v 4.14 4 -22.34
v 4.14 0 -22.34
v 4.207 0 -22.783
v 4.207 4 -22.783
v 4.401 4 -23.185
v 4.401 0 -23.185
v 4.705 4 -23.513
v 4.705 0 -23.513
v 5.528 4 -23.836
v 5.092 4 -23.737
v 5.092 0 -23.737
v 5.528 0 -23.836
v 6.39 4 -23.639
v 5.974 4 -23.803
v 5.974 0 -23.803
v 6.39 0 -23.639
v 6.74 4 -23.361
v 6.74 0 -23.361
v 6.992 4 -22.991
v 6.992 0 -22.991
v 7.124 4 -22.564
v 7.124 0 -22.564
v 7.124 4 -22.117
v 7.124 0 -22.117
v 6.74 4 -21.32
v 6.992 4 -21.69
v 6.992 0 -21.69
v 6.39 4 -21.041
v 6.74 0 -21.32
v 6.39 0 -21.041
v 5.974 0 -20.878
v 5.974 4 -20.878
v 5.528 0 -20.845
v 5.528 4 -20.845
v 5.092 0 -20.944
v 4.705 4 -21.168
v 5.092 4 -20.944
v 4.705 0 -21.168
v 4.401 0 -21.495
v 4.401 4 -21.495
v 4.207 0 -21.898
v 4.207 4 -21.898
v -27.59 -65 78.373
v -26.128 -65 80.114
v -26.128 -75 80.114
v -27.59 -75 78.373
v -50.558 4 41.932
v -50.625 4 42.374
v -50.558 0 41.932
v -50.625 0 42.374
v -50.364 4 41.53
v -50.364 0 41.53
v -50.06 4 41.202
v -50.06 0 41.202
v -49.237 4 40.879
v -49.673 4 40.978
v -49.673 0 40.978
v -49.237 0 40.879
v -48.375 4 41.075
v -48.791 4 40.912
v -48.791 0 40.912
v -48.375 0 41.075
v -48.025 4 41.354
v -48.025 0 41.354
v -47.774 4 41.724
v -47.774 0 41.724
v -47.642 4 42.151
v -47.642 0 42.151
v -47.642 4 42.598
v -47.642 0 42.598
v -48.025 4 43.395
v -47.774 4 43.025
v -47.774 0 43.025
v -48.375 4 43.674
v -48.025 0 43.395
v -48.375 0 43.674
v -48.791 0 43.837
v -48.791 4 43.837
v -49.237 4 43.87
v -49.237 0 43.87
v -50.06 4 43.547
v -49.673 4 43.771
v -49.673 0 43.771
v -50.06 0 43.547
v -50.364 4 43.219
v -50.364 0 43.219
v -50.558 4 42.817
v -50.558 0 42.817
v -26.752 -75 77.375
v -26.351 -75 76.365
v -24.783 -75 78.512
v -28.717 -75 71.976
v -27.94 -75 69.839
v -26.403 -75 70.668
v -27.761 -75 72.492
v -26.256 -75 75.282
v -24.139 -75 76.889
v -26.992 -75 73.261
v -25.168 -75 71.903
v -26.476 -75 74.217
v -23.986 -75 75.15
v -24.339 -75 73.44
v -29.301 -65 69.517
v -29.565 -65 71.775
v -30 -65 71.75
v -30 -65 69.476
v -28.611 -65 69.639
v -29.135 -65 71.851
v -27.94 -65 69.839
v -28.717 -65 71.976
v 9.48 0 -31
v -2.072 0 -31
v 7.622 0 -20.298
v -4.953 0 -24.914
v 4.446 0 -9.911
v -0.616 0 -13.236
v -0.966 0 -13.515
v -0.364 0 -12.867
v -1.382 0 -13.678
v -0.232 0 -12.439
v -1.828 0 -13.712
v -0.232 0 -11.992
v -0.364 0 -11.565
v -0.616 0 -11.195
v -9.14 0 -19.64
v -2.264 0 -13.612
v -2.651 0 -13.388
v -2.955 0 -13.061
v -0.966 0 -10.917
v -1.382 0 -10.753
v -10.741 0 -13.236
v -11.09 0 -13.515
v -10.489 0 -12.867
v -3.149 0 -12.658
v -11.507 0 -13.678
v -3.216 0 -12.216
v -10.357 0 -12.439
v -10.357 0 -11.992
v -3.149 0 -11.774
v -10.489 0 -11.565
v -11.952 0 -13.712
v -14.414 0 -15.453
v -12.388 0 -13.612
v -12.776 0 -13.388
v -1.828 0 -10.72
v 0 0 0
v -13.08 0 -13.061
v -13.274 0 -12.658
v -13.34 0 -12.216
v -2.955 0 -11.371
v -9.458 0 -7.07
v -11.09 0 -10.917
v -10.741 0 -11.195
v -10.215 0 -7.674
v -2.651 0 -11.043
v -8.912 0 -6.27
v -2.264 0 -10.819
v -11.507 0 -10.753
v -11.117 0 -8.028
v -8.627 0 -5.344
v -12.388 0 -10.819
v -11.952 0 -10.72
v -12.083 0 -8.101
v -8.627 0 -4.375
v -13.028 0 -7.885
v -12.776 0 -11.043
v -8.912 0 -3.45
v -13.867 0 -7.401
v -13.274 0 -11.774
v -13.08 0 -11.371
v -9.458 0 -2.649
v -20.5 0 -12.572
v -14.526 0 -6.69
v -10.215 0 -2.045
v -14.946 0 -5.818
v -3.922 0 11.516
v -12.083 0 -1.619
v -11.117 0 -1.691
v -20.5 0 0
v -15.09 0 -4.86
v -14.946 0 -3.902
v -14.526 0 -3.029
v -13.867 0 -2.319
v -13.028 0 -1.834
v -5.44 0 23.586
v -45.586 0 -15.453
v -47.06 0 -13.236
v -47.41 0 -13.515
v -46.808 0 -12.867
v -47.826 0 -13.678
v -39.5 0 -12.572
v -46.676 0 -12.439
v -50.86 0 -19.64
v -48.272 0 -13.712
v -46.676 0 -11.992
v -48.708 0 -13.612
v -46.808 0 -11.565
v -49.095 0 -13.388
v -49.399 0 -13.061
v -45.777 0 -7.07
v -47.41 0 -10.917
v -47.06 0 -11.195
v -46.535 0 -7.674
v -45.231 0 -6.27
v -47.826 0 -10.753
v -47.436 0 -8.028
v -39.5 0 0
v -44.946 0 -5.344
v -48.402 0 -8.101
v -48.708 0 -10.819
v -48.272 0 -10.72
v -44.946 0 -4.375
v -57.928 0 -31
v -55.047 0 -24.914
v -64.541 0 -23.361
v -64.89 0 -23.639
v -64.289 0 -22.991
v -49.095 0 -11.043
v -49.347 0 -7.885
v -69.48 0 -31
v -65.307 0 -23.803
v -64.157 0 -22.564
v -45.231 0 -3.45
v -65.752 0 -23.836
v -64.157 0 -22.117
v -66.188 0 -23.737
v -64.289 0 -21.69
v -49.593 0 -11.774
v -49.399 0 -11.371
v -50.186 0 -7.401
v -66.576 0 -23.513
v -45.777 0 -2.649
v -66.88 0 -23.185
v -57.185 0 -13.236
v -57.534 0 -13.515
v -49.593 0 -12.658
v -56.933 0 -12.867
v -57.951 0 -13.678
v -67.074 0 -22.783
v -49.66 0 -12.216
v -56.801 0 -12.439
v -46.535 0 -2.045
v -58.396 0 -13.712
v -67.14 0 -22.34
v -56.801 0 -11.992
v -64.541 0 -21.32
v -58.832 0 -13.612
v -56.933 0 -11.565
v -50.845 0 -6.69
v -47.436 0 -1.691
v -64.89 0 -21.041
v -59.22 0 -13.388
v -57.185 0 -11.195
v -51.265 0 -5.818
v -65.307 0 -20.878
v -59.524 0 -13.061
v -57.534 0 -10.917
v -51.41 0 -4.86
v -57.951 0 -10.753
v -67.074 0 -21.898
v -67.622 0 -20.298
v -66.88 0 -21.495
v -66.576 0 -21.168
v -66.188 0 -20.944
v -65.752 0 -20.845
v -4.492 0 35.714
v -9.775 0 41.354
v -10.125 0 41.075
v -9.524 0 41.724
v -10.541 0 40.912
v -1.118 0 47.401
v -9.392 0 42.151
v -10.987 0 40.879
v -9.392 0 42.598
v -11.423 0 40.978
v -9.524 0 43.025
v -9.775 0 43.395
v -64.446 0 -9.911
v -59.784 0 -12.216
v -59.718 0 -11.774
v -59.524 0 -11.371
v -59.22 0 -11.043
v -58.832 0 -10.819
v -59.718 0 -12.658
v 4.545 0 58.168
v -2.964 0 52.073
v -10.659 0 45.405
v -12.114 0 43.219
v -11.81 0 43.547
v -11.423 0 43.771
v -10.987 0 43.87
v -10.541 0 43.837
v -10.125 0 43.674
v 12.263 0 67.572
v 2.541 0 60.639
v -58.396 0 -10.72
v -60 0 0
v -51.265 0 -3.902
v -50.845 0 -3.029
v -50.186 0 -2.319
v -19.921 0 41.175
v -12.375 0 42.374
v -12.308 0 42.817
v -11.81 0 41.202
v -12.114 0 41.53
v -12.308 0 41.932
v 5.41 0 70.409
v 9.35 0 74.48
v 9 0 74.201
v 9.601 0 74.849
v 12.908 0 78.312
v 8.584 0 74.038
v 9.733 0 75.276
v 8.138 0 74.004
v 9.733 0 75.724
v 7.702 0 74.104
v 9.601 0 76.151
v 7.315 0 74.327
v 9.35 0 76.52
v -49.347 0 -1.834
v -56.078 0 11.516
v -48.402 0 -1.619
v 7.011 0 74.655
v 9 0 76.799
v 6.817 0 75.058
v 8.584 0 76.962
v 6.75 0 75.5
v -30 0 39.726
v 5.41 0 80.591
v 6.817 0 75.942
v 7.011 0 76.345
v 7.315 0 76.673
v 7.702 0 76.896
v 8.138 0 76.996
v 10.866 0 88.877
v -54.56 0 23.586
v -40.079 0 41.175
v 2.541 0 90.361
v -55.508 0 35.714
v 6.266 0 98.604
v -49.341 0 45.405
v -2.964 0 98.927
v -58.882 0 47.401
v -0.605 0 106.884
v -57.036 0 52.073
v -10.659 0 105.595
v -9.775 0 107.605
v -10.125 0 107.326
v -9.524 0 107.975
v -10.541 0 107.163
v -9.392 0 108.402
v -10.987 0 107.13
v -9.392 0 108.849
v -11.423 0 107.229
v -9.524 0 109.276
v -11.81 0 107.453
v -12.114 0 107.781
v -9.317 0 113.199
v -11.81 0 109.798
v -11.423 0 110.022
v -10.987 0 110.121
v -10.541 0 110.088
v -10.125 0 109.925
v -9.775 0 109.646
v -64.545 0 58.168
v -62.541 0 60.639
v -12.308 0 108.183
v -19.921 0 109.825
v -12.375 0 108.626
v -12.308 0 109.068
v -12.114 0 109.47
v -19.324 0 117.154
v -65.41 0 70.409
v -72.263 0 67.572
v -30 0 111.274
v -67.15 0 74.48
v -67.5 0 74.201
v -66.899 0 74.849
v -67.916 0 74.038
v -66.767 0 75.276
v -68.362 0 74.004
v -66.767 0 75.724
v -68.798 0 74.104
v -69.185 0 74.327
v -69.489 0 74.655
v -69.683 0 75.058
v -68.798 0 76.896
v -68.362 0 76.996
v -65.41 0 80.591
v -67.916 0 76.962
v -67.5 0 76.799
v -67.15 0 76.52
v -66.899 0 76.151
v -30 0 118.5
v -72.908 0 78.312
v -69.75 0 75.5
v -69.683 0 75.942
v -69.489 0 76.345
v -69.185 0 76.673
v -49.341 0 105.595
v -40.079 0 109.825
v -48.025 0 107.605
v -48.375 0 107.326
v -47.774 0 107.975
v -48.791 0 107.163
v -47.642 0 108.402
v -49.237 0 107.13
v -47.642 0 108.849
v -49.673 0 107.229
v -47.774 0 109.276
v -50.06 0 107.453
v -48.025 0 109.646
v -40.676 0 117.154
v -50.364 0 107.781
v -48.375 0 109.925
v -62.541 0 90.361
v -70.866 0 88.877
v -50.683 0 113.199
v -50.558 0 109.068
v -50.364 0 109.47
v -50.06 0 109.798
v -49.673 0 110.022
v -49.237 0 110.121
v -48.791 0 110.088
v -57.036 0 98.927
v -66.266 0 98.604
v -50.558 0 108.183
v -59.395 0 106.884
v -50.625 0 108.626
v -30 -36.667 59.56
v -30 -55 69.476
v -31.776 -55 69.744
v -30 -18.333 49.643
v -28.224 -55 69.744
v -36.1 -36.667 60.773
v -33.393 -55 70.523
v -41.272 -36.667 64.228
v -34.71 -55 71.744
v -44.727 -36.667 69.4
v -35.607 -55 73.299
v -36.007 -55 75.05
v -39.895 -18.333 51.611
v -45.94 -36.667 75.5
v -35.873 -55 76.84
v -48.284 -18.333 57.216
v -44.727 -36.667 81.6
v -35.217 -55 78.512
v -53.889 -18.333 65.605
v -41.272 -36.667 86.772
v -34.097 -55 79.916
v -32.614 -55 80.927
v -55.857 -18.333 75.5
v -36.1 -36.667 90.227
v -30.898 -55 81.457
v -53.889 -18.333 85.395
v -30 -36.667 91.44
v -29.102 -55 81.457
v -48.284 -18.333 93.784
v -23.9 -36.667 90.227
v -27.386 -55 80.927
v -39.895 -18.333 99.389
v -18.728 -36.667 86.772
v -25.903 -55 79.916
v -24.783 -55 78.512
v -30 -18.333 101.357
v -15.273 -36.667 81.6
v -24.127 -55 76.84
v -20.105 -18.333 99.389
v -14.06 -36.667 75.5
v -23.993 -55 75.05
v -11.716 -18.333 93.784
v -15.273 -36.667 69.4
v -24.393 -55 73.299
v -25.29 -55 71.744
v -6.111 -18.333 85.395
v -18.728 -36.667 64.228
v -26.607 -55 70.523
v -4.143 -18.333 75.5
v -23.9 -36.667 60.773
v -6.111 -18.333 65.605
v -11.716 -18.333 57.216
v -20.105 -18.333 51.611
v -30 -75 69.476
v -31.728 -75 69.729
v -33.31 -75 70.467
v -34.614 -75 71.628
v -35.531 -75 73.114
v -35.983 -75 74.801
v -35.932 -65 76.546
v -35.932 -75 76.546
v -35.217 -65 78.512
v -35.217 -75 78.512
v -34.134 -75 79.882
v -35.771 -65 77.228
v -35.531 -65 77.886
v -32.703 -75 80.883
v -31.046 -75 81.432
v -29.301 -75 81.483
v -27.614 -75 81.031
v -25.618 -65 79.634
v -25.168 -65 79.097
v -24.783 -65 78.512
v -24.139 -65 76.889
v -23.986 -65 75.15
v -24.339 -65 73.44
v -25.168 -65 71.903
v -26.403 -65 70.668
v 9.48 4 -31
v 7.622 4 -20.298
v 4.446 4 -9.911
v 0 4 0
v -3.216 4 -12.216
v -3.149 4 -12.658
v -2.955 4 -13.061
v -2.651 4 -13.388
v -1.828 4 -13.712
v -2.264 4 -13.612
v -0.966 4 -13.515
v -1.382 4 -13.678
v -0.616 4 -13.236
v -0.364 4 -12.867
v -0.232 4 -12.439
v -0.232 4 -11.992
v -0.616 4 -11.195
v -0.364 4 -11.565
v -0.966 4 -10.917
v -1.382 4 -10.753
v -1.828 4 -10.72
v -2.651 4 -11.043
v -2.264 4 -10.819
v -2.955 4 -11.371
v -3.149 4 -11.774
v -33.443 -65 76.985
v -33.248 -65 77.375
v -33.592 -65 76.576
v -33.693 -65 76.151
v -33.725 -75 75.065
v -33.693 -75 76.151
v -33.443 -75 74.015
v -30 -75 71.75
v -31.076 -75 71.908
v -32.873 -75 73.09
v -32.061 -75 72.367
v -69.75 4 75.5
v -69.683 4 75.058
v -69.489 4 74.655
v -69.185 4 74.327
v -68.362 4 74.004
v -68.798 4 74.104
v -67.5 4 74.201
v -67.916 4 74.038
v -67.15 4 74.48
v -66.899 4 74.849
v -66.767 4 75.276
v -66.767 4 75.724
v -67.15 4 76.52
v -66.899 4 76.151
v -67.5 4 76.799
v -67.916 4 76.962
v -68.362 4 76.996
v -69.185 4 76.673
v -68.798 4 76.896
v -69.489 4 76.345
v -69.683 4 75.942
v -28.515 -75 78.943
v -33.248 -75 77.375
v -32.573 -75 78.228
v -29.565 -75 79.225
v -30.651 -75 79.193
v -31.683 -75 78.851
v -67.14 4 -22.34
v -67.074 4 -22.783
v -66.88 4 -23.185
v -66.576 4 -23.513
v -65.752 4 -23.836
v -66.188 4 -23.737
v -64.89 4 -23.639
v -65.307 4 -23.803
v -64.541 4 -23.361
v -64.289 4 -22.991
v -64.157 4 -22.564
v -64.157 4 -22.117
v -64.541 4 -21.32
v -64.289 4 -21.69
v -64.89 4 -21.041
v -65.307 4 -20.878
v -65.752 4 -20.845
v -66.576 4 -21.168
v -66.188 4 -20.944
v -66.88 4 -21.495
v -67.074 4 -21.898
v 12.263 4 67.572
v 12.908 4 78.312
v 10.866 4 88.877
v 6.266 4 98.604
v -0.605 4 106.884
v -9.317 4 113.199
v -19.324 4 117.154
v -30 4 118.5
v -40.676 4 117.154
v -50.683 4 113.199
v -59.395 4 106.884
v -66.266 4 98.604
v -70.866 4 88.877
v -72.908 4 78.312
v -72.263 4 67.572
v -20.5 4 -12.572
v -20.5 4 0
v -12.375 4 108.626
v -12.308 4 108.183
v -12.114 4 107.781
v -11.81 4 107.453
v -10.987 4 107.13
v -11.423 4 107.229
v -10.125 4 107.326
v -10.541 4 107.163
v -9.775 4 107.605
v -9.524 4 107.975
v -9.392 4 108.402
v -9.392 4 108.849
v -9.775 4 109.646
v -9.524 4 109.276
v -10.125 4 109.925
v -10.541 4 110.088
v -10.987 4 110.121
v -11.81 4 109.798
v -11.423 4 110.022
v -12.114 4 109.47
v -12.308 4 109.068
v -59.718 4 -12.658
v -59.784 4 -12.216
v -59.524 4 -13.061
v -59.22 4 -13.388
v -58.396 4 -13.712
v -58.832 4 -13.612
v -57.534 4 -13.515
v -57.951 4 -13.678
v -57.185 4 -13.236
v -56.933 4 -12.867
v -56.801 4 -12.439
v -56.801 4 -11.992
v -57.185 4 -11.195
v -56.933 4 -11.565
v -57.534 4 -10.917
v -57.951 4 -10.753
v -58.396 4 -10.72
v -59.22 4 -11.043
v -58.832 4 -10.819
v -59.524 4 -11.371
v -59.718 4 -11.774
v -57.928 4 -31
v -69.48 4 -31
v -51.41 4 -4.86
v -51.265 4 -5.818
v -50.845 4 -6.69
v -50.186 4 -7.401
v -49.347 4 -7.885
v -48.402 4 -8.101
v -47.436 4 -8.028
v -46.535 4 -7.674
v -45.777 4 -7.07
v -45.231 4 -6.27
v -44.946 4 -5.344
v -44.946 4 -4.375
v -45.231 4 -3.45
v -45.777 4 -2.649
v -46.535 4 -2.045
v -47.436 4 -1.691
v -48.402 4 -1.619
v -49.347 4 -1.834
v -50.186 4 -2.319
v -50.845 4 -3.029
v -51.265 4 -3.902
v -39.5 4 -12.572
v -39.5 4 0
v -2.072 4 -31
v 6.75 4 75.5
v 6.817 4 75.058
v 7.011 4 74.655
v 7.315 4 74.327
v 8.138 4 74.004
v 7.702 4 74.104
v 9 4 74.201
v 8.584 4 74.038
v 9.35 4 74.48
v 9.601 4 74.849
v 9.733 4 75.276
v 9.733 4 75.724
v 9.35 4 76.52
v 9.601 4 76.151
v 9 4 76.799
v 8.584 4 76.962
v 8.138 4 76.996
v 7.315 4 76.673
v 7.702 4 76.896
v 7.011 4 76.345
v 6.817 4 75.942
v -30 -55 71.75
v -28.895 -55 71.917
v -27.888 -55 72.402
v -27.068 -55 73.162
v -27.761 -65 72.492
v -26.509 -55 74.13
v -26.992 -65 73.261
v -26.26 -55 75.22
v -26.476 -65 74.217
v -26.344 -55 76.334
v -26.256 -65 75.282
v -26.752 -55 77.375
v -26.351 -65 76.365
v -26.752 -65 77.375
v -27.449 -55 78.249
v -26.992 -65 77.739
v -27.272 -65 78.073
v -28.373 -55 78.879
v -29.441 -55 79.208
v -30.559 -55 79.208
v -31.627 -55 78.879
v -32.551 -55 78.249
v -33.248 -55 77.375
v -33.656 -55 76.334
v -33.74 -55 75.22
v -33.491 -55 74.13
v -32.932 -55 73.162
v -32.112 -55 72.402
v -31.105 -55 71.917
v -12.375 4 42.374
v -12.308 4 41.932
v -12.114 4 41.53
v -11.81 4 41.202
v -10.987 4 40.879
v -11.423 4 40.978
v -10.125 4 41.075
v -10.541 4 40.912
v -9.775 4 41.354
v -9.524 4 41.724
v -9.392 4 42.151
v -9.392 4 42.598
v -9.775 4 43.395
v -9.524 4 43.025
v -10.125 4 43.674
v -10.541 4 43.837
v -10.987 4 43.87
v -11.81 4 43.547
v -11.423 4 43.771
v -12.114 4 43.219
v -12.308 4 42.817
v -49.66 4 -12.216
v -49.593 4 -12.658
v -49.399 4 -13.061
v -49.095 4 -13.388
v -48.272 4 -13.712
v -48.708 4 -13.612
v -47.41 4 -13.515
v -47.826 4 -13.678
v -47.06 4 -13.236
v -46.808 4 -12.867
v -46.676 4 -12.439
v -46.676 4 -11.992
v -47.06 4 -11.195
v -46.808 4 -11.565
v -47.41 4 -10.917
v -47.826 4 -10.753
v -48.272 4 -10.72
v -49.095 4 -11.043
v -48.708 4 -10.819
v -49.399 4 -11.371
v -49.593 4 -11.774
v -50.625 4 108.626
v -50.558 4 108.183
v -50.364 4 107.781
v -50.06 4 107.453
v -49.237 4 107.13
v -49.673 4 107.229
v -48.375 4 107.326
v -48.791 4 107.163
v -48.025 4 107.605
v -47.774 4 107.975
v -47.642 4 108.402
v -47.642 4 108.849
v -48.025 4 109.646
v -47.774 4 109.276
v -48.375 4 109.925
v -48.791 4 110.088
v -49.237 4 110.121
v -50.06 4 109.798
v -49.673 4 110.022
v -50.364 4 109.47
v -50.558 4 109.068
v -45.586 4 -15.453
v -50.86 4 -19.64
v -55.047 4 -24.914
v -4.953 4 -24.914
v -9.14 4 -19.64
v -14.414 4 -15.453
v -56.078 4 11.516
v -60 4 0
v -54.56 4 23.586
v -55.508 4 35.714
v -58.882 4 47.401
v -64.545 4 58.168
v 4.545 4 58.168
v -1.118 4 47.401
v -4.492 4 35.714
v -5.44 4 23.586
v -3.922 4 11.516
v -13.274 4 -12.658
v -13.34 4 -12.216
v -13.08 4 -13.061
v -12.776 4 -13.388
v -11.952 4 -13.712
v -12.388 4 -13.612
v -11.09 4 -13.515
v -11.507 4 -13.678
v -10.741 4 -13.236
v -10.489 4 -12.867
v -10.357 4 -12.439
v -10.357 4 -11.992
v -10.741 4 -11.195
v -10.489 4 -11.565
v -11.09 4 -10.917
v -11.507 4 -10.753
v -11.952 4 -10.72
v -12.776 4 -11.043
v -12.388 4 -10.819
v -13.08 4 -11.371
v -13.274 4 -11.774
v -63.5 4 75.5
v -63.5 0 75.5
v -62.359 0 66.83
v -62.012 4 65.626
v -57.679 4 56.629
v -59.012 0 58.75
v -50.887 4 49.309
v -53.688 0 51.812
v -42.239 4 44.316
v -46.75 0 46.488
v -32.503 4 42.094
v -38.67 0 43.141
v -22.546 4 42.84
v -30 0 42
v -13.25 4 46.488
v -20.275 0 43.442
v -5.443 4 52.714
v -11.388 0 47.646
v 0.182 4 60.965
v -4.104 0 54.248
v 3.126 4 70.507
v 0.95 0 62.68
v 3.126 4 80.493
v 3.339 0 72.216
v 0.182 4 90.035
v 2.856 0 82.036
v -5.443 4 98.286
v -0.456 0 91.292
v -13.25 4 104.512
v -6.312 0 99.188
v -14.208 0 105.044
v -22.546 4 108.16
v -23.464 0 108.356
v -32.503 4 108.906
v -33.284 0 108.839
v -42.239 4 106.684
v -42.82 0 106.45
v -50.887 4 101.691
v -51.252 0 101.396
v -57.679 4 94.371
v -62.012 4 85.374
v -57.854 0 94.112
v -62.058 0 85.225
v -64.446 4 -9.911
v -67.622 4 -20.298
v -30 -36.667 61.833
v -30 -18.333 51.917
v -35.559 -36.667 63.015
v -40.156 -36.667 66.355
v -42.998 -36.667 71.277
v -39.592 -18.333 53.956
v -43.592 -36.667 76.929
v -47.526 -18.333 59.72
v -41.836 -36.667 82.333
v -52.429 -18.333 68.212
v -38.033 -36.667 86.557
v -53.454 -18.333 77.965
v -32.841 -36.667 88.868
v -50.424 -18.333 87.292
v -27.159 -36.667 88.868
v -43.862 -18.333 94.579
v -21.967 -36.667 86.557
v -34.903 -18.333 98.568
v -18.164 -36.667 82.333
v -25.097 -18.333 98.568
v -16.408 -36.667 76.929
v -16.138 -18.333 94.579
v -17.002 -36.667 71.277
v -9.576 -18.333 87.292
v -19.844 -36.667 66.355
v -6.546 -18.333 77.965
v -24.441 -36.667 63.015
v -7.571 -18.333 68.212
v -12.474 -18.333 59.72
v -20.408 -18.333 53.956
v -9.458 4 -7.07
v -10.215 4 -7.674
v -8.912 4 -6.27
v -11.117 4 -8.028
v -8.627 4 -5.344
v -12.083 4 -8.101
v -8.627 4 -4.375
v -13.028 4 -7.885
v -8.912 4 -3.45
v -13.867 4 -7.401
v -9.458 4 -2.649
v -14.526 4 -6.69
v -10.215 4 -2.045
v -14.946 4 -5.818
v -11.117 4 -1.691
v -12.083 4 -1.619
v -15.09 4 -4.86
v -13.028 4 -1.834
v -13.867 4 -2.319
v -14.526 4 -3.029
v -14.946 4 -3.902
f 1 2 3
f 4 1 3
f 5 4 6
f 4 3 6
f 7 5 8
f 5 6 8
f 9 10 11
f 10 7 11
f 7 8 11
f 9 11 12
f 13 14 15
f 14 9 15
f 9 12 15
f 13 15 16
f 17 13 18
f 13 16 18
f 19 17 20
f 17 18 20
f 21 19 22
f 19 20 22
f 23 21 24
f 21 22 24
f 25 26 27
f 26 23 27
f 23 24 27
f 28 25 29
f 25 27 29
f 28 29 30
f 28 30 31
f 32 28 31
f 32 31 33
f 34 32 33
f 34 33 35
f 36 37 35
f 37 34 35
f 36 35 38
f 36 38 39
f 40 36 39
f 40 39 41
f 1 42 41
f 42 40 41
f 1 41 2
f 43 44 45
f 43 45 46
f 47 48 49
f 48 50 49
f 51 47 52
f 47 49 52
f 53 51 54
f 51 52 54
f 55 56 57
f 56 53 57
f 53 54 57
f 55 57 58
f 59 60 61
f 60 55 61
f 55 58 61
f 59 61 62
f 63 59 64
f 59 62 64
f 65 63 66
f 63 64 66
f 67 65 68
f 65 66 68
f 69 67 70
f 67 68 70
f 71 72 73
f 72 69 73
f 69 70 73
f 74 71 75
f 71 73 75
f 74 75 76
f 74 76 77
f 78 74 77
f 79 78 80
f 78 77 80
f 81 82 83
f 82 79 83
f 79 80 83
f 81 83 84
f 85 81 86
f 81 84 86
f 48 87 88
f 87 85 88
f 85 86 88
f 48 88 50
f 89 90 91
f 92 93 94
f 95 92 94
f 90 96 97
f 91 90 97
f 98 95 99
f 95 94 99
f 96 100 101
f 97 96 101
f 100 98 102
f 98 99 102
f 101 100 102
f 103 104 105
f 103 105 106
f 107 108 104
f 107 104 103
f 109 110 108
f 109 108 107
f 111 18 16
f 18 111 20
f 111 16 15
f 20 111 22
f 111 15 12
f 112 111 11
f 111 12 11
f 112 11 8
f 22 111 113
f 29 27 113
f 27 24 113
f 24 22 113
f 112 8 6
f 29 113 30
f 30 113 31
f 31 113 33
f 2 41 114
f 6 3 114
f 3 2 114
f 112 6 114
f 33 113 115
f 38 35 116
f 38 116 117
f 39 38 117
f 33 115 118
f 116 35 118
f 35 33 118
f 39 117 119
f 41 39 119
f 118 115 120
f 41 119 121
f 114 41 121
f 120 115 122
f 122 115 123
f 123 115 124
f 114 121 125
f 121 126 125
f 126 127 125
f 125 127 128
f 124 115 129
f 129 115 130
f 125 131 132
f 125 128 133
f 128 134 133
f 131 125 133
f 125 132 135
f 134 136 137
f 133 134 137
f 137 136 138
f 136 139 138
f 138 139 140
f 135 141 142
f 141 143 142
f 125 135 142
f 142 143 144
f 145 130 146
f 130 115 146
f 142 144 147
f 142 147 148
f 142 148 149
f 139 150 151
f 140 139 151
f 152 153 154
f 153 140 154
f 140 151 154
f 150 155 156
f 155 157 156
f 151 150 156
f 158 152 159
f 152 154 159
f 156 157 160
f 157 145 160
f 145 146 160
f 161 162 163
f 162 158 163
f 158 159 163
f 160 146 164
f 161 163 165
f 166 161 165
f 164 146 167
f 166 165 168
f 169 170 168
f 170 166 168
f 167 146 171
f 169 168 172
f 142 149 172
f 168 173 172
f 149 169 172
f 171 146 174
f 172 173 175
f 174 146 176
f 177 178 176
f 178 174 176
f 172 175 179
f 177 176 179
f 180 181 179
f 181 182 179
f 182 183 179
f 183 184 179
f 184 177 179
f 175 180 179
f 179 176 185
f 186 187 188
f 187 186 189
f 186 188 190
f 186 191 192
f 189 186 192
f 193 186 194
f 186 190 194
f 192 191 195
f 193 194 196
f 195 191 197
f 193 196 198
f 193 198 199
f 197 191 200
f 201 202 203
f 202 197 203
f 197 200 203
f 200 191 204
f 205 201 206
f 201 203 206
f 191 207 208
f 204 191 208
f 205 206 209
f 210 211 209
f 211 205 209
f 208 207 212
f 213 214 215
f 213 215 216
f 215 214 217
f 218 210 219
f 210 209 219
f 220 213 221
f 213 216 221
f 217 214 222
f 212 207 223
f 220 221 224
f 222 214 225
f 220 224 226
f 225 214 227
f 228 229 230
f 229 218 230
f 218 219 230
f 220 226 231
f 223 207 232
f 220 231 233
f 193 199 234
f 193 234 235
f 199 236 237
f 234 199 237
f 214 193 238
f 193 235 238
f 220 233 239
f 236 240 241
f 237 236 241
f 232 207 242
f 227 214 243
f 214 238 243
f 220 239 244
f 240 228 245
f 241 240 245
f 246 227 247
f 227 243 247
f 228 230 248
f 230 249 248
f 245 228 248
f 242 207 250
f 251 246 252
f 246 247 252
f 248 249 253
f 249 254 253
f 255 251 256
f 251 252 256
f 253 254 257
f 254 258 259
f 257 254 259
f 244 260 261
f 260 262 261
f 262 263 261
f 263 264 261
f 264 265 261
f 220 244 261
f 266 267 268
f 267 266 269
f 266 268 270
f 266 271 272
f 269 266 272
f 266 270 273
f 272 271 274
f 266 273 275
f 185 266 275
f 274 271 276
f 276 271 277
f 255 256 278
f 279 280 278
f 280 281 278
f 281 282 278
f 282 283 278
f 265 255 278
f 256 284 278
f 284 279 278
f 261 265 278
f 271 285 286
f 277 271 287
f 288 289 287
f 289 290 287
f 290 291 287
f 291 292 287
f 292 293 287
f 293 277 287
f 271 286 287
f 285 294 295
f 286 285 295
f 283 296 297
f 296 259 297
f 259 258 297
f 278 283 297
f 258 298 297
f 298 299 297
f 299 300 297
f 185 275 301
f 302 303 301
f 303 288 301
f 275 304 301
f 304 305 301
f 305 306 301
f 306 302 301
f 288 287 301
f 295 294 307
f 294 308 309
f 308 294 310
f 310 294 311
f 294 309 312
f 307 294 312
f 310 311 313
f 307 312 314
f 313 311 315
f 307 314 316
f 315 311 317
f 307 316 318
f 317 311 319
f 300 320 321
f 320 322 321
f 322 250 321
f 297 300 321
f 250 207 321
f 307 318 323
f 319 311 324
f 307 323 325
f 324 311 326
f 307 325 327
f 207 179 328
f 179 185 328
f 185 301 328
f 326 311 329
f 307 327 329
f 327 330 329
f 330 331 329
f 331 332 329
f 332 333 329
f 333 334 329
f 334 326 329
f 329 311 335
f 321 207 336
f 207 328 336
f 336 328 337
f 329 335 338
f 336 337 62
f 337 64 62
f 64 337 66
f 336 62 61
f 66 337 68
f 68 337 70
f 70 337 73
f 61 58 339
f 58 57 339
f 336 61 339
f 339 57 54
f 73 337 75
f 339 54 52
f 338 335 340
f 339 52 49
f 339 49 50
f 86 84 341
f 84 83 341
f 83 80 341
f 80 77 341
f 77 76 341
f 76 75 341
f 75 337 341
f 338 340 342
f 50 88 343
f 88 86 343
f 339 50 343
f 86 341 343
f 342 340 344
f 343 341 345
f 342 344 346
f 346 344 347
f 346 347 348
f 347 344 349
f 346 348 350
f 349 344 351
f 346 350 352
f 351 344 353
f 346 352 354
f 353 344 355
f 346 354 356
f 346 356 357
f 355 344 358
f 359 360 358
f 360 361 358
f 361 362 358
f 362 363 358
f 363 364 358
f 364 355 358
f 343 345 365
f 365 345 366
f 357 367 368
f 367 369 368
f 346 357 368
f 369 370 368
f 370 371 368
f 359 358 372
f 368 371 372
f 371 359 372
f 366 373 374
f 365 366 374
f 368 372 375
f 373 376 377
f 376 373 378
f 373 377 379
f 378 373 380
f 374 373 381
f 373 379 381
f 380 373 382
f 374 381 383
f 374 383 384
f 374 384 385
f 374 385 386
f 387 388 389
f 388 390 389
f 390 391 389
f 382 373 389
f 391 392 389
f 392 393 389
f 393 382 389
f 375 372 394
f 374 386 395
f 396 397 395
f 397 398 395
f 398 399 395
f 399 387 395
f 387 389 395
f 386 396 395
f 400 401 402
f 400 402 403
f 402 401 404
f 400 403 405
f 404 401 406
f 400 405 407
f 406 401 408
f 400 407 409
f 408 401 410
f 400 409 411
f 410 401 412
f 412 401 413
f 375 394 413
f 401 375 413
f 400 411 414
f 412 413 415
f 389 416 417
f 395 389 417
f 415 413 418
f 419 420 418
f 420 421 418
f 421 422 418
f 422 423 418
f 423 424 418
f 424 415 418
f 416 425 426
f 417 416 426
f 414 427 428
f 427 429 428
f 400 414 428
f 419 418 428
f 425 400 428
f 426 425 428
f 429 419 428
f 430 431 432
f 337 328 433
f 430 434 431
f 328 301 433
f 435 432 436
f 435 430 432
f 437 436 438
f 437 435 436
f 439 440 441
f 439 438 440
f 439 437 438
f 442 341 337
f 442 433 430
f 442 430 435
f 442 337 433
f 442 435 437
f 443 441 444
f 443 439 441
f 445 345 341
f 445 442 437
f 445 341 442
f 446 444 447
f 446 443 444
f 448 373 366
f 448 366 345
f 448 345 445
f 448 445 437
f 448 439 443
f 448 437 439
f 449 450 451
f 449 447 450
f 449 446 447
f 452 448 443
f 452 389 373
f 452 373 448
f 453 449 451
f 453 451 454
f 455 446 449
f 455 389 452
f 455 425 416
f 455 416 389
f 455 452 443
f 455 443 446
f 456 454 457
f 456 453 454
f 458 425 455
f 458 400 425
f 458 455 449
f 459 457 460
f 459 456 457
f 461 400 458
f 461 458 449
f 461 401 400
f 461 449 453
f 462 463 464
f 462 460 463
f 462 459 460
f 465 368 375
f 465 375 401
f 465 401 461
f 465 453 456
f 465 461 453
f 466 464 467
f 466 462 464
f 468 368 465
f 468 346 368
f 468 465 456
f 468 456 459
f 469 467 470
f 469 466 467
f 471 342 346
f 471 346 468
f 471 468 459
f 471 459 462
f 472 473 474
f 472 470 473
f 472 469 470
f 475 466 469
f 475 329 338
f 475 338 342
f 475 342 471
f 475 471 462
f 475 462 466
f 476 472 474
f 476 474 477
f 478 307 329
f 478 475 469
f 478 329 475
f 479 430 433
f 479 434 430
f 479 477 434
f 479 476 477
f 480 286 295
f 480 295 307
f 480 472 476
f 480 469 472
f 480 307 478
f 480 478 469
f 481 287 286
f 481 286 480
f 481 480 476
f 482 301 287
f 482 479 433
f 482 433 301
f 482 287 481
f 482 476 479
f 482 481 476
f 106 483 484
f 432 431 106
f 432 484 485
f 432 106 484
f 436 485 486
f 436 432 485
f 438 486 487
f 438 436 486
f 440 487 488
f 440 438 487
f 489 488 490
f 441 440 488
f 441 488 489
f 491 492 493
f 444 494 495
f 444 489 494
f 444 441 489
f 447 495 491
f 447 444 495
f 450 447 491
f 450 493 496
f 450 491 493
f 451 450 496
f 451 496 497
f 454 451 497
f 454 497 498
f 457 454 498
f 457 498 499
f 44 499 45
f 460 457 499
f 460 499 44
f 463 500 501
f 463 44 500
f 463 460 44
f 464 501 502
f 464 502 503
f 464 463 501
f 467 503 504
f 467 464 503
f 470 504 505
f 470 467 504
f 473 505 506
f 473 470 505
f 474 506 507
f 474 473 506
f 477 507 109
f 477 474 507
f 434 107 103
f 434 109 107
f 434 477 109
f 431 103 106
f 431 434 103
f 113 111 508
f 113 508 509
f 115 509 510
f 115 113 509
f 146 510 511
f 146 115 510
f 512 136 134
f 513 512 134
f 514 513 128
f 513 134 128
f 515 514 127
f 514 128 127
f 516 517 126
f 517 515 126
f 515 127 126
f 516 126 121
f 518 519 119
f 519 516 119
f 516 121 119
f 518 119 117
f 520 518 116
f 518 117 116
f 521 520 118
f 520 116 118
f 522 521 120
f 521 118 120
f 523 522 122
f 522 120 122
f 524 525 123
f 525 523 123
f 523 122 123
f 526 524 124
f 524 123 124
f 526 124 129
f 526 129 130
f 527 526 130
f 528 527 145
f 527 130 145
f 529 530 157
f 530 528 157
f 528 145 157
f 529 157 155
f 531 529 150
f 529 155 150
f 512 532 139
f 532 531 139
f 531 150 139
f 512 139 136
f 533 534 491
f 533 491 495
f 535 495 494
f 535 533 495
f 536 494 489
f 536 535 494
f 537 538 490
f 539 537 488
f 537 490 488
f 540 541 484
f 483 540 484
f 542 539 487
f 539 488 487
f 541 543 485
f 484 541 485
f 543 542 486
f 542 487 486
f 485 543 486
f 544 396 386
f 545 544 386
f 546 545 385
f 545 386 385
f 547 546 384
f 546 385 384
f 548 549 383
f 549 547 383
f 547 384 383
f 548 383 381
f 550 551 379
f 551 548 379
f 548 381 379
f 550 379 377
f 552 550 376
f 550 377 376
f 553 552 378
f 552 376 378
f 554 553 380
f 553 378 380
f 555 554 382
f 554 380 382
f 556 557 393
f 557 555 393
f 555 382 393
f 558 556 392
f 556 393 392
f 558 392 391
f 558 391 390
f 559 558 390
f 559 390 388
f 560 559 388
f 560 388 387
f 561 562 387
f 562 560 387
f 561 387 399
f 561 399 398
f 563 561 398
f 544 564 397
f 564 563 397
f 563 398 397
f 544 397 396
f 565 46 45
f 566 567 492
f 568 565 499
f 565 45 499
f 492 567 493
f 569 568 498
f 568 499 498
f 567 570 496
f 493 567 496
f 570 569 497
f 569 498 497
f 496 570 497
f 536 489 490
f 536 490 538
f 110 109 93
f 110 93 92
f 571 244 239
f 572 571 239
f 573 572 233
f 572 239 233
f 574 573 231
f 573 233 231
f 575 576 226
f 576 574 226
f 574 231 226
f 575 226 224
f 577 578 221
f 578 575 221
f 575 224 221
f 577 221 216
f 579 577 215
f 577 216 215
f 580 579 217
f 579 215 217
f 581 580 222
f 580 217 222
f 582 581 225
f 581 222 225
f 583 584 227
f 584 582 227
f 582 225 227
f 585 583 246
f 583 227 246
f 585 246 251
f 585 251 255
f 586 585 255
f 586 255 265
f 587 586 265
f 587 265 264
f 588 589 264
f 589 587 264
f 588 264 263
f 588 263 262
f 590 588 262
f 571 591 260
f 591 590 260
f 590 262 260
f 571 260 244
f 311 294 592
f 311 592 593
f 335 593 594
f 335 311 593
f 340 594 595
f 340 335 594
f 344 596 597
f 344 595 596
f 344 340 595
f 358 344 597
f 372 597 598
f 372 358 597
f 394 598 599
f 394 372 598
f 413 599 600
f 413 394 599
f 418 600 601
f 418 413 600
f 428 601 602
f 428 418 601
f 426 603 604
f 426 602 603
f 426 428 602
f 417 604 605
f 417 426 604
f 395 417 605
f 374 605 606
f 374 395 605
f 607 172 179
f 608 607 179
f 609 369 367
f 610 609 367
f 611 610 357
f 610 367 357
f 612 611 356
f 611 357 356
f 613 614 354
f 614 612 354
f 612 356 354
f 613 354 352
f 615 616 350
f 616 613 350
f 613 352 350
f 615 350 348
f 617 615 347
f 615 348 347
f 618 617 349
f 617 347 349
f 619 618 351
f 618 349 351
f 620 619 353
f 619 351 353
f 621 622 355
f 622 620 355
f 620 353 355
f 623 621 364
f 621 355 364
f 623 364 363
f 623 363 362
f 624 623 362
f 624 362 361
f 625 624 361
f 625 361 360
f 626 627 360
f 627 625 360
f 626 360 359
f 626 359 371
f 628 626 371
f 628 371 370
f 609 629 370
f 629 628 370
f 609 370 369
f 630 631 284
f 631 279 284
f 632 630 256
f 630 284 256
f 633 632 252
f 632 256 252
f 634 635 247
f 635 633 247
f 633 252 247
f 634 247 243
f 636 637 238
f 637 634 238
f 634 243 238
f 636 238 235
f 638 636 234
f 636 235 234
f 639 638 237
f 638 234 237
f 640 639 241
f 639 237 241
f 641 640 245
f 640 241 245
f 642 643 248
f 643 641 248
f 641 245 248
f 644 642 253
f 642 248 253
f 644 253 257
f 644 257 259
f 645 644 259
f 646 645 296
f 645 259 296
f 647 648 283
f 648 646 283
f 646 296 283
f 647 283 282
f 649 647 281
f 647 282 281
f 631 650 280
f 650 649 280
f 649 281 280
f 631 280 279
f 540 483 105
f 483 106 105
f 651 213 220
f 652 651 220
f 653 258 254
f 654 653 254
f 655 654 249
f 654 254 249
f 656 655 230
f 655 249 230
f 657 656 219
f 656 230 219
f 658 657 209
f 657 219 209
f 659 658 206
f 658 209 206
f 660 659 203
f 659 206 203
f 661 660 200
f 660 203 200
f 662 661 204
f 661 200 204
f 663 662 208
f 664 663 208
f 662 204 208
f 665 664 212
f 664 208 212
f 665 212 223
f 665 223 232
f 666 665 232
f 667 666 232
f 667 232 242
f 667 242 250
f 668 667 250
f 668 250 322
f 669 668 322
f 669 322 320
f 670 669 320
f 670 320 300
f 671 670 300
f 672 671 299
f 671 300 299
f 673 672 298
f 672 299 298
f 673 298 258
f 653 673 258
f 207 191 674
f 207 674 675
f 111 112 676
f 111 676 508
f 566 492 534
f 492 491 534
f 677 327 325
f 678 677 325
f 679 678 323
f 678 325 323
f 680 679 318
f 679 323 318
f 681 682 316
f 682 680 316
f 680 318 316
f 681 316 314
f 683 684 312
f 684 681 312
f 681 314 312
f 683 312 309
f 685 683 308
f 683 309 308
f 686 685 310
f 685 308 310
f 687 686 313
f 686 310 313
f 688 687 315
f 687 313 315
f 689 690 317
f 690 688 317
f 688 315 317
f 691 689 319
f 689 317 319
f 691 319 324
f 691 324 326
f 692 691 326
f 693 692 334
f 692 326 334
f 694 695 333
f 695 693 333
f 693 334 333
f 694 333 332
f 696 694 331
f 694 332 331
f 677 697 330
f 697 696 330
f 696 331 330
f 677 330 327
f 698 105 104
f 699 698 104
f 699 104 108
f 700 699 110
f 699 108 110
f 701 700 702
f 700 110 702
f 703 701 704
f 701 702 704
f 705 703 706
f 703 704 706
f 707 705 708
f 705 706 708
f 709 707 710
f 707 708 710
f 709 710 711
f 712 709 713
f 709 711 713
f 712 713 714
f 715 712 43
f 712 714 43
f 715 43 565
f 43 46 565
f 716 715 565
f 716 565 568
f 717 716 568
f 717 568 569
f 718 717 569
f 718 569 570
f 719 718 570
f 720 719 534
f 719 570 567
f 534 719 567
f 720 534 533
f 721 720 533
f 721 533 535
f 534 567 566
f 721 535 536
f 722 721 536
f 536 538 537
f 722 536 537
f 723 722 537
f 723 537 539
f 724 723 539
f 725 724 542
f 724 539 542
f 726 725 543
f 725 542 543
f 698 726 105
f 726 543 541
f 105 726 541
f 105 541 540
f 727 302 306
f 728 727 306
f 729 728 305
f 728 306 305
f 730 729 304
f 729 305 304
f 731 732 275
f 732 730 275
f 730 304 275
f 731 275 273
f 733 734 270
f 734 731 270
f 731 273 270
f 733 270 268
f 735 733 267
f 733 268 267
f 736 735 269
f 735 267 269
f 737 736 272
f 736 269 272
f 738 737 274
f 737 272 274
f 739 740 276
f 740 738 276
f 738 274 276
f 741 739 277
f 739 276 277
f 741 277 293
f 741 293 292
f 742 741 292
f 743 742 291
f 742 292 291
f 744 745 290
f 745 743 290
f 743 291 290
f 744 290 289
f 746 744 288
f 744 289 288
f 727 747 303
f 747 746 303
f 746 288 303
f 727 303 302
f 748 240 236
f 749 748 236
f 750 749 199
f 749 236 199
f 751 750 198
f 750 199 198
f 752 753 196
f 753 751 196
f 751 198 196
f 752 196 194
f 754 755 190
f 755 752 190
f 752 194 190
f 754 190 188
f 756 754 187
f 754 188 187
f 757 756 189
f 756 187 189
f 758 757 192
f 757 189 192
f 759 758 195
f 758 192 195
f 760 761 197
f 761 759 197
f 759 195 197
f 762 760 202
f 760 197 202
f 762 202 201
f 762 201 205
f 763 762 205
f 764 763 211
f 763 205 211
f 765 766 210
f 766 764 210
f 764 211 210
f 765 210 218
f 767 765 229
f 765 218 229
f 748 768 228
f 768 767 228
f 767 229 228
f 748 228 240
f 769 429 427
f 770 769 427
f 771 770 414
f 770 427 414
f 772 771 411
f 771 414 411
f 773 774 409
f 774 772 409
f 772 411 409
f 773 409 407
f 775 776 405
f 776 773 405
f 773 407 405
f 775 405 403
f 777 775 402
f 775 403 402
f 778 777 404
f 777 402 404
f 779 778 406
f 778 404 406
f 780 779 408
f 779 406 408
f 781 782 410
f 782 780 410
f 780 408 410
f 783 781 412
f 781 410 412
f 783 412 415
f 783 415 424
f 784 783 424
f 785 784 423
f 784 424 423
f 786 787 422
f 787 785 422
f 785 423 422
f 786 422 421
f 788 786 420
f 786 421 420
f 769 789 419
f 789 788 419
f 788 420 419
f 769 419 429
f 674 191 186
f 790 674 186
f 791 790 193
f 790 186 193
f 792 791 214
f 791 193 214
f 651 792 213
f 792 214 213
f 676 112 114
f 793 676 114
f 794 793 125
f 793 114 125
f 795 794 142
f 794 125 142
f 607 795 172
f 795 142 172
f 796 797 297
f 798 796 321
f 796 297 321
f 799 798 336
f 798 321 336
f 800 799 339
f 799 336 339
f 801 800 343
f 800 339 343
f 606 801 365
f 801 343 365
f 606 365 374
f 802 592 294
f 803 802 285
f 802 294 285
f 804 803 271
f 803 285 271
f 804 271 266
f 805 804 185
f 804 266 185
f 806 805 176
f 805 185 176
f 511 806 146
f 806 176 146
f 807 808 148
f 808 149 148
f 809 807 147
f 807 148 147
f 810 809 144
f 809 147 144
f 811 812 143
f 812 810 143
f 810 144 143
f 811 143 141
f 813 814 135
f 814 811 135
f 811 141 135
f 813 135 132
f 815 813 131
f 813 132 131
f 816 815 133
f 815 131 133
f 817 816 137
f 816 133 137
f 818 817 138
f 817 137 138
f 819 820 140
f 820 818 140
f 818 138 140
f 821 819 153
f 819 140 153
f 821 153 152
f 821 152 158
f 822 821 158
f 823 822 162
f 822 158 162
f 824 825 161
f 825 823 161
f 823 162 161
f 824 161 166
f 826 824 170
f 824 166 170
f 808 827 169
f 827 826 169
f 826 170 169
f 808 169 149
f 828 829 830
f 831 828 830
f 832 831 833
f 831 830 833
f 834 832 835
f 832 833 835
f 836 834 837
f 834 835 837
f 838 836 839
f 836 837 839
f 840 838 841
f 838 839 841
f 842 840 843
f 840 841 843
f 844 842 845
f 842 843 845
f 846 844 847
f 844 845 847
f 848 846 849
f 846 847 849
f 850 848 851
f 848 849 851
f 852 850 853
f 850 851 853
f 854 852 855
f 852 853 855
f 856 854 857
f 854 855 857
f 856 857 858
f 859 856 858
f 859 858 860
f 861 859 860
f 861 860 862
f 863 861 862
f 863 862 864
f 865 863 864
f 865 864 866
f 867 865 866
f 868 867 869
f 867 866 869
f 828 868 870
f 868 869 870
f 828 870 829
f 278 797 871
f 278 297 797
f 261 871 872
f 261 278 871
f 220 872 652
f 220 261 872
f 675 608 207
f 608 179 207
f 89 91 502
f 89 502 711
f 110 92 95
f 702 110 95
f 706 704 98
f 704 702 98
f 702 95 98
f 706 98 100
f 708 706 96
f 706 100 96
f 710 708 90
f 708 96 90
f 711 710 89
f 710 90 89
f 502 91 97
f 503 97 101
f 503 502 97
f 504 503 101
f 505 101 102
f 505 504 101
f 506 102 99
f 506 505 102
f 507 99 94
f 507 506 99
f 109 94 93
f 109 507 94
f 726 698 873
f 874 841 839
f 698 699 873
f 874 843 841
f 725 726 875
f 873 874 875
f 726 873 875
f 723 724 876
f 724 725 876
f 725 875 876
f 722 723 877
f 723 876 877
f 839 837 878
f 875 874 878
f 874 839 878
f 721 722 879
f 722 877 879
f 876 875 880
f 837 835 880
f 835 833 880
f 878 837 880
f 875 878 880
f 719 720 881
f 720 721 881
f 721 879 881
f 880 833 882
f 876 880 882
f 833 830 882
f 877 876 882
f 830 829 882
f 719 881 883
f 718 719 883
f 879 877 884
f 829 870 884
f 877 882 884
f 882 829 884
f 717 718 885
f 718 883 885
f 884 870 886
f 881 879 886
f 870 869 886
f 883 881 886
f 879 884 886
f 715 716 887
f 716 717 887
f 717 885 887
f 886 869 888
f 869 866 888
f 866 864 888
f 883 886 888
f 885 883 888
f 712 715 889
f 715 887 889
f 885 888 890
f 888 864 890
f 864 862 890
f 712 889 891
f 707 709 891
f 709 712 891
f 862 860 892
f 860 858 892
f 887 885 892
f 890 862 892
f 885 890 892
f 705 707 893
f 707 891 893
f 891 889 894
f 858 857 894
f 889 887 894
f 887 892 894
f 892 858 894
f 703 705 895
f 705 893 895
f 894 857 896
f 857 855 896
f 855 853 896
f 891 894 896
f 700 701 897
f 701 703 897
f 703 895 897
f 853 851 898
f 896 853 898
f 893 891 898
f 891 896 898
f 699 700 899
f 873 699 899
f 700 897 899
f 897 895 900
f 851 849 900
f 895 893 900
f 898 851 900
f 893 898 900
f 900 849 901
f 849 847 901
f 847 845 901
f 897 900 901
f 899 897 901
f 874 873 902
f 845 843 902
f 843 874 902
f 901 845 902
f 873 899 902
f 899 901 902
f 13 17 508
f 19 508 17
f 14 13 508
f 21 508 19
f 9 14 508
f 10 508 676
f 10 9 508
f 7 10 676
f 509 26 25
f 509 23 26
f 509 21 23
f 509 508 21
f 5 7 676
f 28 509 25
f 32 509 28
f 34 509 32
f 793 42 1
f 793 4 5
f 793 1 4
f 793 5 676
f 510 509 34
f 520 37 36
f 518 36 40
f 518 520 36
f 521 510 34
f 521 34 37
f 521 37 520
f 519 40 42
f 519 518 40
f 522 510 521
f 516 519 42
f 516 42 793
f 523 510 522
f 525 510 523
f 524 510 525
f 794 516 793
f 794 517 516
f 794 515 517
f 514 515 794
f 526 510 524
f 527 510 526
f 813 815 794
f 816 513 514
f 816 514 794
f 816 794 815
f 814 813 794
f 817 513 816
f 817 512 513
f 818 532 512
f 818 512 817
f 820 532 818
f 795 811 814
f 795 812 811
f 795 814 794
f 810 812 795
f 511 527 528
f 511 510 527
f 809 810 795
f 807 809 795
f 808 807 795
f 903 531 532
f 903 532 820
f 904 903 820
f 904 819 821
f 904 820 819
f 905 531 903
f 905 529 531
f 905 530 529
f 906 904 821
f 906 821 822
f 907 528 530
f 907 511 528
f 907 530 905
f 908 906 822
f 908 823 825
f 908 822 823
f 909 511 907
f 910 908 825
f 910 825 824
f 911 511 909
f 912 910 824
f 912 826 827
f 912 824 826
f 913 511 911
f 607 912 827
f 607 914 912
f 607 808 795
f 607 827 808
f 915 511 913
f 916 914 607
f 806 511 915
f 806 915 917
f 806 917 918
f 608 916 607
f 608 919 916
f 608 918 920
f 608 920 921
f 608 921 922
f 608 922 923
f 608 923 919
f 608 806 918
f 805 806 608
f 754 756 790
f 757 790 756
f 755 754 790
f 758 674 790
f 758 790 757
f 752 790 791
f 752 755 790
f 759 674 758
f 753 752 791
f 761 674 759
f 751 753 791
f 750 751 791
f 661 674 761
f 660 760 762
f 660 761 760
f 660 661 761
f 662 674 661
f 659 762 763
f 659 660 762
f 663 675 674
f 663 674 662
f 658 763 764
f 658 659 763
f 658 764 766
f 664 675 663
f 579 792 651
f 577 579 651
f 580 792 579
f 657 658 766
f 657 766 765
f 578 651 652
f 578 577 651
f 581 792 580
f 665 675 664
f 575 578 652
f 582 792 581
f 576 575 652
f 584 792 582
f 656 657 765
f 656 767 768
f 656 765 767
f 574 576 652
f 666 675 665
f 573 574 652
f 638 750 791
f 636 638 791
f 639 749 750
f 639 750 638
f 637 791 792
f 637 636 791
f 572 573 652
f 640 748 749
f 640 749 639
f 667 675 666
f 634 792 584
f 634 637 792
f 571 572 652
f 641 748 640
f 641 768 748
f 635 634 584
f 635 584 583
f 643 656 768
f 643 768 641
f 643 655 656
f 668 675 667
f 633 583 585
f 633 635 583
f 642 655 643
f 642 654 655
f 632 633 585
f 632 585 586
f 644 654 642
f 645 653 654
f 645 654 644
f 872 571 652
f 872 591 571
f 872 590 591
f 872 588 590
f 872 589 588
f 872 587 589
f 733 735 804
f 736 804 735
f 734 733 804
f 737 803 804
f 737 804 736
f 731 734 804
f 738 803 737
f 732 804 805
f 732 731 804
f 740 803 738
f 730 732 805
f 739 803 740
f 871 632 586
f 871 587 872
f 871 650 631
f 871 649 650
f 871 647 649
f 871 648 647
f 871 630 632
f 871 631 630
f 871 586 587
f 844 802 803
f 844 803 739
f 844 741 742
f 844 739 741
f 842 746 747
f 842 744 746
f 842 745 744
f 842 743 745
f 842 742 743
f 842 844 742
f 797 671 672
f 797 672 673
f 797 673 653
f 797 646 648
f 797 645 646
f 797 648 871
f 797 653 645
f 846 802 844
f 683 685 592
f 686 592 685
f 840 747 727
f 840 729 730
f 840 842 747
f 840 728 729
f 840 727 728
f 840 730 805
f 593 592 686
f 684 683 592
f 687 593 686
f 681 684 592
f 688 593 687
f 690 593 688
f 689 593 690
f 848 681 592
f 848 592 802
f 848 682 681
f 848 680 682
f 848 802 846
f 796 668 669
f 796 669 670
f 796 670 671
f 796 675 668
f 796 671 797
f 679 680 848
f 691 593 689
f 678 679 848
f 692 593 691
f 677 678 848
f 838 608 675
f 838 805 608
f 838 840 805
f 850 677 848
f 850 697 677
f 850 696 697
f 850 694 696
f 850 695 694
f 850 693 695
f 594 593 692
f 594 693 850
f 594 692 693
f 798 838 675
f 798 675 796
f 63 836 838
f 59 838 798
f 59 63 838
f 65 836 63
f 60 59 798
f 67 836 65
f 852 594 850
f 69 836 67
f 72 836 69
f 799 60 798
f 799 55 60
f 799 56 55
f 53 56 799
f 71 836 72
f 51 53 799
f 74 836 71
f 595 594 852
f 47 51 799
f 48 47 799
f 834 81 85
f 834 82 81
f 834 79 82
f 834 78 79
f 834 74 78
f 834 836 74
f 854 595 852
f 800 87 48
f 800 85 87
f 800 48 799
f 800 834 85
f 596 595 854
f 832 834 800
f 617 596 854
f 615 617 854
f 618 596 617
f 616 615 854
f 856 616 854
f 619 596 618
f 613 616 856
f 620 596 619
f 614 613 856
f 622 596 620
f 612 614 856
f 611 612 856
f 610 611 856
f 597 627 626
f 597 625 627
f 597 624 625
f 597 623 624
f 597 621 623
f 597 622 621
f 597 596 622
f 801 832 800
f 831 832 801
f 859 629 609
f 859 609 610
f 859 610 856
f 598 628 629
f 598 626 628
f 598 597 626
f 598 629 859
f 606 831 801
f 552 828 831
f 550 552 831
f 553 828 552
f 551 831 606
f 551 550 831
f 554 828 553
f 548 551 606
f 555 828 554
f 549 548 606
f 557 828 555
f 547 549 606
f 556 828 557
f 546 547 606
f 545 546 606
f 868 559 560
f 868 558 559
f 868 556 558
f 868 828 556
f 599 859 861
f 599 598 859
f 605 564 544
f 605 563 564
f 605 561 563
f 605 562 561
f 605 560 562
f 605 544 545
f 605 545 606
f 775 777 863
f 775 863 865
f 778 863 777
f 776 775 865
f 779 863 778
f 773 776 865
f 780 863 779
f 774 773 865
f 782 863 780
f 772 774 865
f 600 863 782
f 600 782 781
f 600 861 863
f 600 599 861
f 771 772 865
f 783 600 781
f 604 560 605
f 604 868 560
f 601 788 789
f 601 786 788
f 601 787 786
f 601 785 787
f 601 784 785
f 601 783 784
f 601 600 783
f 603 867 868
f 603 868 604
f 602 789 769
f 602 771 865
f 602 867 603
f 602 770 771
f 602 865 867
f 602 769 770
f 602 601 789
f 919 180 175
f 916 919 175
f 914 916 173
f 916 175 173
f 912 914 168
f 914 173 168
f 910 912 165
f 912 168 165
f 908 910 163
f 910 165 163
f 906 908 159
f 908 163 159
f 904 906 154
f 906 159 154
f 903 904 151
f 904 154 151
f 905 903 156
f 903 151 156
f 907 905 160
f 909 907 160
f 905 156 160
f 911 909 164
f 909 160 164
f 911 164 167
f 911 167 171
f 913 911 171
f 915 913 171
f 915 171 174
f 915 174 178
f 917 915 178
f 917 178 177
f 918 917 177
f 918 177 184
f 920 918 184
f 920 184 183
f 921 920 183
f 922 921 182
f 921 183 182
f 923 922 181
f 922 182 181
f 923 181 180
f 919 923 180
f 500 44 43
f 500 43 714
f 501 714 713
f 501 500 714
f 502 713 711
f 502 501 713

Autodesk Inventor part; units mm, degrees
ref_plane "YZ Plane" through (0, 0, 0) normal (1, 0, 0) x (0, 1, 0)
ref_plane "XZ Plane" through (0, 0, 0) normal (0, 1, 0) x (-1, 0, 0)
ref_plane "XY Plane" through (0, 0, 0) normal (0, 0, 1) x (1, 0, 0)
sketch "Sketch1" plane through (0, 0, 0) normal (0, 1, 0) x (-1, 0, 0)
  line L0 (0, 0) -> (60, 0)
  line L1 (60, -81) -> (0, -81)
  line L2 (0, -81) -> (0, -40.5)
  line L3 (44.9096, -21.5055) -> (14.9096, -21.5055) construction
  line L4 (44.9096, -81) -> (44.9096, 0) construction
  line L5 (14.9096, 0) -> (14.9096, -81) construction
  circle A0 centre (39.9096, -73.5) radius 1.5
  circle A1 centre (39.9096, -7.5) radius 1.5
  circle A2 centre (19.9096, -7.5) radius 1.5
  circle A3 centre (19.9096, -73.5) radius 1.5
  line L6 (60, -40.5) -> (0, -40.5) construction
  line L7 (30, 0) -> (30, -81) construction
  circle A4 centre (30, -40.5) radius 24
  circle A5 centre (30, -40.5) radius 27.5
  circle A6 centre (57.1293, -36) radius 1.5
  circle A7 centre (57.1293, -45) radius 1.5
  circle A8 centre (25.5, -13.3707) radius 1.5
  circle A9 centre (34.5, -13.3707) radius 1.5
  circle A10 centre (2.8707, -45) radius 1.5
  circle A11 centre (2.8707, -36) radius 1.5
  circle A12 centre (34.5, -67.6293) radius 1.5
  circle A13 centre (25.5, -67.6293) radius 1.5
  arc A14 (60, -81) -> (60, 0) centre (-17.0125, -40.5) ccw
  arc A15 (-5.7831, -34.5157) -> (14.9096, -7.5073) centre (30, -40.5) ccw construction
  circle A16 centre (65.9998, -36) radius 1.5
  circle A17 centre (65.9998, -45) radius 1.5
  circle A18 centre (-5.9998, -45) radius 1.5
  circle A19 centre (-5.9998, -36) radius 1.5
  arc A20 (0, 0) -> (0, -81) centre (77.0125, -40.5) ccw
  line L8 (30, -40.5) -> (-3.3536, -73.8536) construction
  circle A21 centre (1.7157, -68.7843) radius 1.5
  circle A22 centre (11.8404, -76.1403) radius 1.5
  circle A23 centre (23.7426, -80.0075) radius 1.5
  circle A24 centre (36.2574, -80.0075) radius 1.5
  circle A25 centre (48.1596, -76.1403) radius 1.5
  circle A26 centre (58.2843, -68.7843) radius 1.5
  circle A27 centre (65.6403, -58.6596) radius 1.5
  circle A28 centre (69.5075, -46.7574) radius 1.5
  circle A29 centre (69.5075, -34.2426) radius 1.5
  circle A30 centre (65.6403, -22.3404) radius 1.5
  circle A31 centre (58.2843, -12.2157) radius 1.5
  circle A32 centre (48.1596, -4.8597) radius 1.5
  circle A33 centre (36.2574, -0.9925) radius 1.5
  circle A34 centre (23.7426, -0.9925) radius 1.5
  circle A35 centre (11.8404, -4.8597) radius 1.5
  circle A36 centre (1.7157, -12.2157) radius 1.5
  circle A37 centre (-5.6403, -22.3404) radius 1.5
  circle A38 centre (-9.5075, -34.2426) radius 1.5
  circle A39 centre (-9.5075, -46.7574) radius 1.5
  circle A40 centre (-5.6403, -58.6596) radius 1.5
  circle A41 centre (48.1596, -68.7843) radius 1.5
  circle A42 centre (48.1596, -12.2157) radius 1.5
  circle A43 centre (11.8404, -12.2157) radius 1.5
  circle A44 centre (11.8404, -68.7843) radius 1.5
  line L9 (56.4575, -33) -> (69.2906, -33)
  line L10 (37.5, -1.2094) -> (37.5, -14.0425)
  line L11 (37.5, -1.2094) -> (37.5, -14.0425)
  circle A45 centre (30, -40.5) radius 27.5
  line L12 (30, -81) -> (30, -0.5) construction
  line L13 (60, -33) -> (60, -81)
  arc A46 (60, -14.0425) -> (59.3249, -13.2961) centre (30, -40.5) ccw construction
  line L14 (55.807, -31) -> (69.4798, -31)
  circle A47 centre (48.1596, -4.8597) radius 3.25
  line L15 (51.4096, -4.8597) -> (51.4096, 0)
  line L16 (44.9096, -4.8597) -> (44.9096, 0)
  circle A48 centre (30, -40.5) radius 29.5
  line L17 (39.5, -12.5715) -> (39.5, 0)
  circle A49 centre (30, 75.5) radius 33.5
  line L18 (148.361, 0) -> (-88.361, 0) projected
  circle A50 centre (30, 75.5) radius 43
  arc A51 (37.7343, -1.2549) -> (13.1894, -4.2039) centre (30, -40.5) ccw
  arc A52 (-9.2451, -32.7657) -> (69.2451, -32.7657) centre (30, -40.5) ccw
  arc A53 (-9.2451, -32.7657) -> (69.2451, -32.7657) centre (30, -40.5) ccw construction
  arc A54 (37.7343, -1.2549) -> (13.1894, -4.2039) centre (30, -40.5) ccw construction
  line L19 (63.5, 75.5) -> (73, 75.5) construction
  circle A55 centre (68.25, 75.5) radius 1.5
  circle A56 centre (49.125, 108.6255) radius 1.5
  circle A57 centre (10.875, 108.6255) radius 1.5
  circle A58 centre (-8.25, 75.5) radius 1.5
  circle A59 centre (10.875, 42.3745) radius 1.5
  circle A60 centre (49.125, 42.3745) radius 1.5
  line L20 (4.193, -31) -> (-9.4798, -31)
  circle A61 centre (11.8404, -4.8597) radius 3.25
  line L21 (20.5, -12.5715) -> (20.5, 0)
  arc A62 (0, 0) -> (-12.2627, 67.5715) centre (-54.5436, 25) ccw
  arc A63 (72.2627, 67.5715) -> (60, 0) centre (114.5436, 25) ccw
  point P0 (29.9096, -21.5055)
  point P1 (30, -40.75)
  point P2 (-7.9036, 55.1945)
  point P3 (57.9285, -31)
  point P4 (2.0715, -31)
  point P5 (72.2627, 67.5715)
  point P6 (2.984, 42.0465)
  point P7 (57.016, 42.0465)
  dimension "d48" = 67
  dimension "d52" = 42
  dimension "d6" = 60
  dimension "d7" = 81
  dimension "d8" = 3
  dimension "d9" = 7.5
  dimension "d10" = 5
  dimension "d11" = 30
  dimension "d12" = 3
  dimension "d13" = 7.5
  dimension "d14" = 5
  dimension "d15" = 3
  dimension "d16" = 3
  dimension "d17" = 5
  dimension "d18" = 48
  dimension "d19" = 55
  dimension "d20" = 3
  dimension "d21" = 4.5
  dimension "d22" = 3
  dimension "d23" = 4.5
  dimension "d24" = 360
  dimension "d26" = 72.56
  dimension "d27" = 3
  dimension "d28" = 3
  dimension "d29" = 360
  dimension "d30" = 45
  dimension "d31" = 3
  dimension "d32" = 360
  dimension "d33" = 3
  dimension "d34" = 3
  dimension "d35" = 3
  dimension "d36" = 3
  dimension "d37" = 55
  dimension "d39" = 90
  dimension "d42" = 12.8331
  dimension "d43" = 12.8331
  dimension "d44" = 2
  dimension "d45" = 6.5
  dimension "d46" = 2
  dimension "d47" = 2
  dimension "d49" = 30
  dimension "d57" = 3
  dimension "d60" = 360
  dimension "d84" = 4.75
  dimension "d85" = 60
  dimension "d86" = 25
extrude "Extrusion1" add sketch "Sketch1" along normal blind 4 contours A62 A50 A63 L0 A33 A34 | L0 L21 A2 A48 L20 A20 | A62 A50 A63 | A34 L0 | L21 A2 | A14 L14 A48 L17 A1 L0 L16 A47 L15 | A33 L0 | L15 A47 L16 L0 | L17 A1 picked at (20.0279, -7.9174) picked at (39.7286, -7.0086)
ref_plane "Work Plane1" through (-30, 0, -12.5715) normal (-1, 0, 0) x (0, 0, 1)
sketch "Sketch3" plane through (-30, 0, -12.5715) normal (-1, 0, 0) x (0, 0, 1)
  line L0 (54.5715, 0) -> (84.3215, -55)
  line L1 (54.5715, 0) -> (121.5715, 0) projected
  line L2 (121.5715, 0) -> (54.5715, 0)
  line L3 (54.5715, 4) -> (121.5715, 4) projected
  line L4 (88.0715, 4) -> (88.0715, -55)
  line L5 (84.3215, -55) -> (82.0477, -55)
  line L6 (82.0477, -55) -> (52.2977, 0)
  line L7 (52.2977, 0) -> (54.5715, 0)
  line L8 (84.3215, -55) -> (84.3215, -65)
  line L9 (82.0477, -55) -> (82.0477, -65)
  line L10 (84.3215, -65) -> (82.0477, -65)
  line L11 (84.3215, -65) -> (84.3215, -75)
  line L12 (84.3215, -75) -> (82.0477, -75)
  line L13 (82.0477, -75) -> (82.0477, -65)
  point P0 (12.5715, 0)
  point P1 (88.0715, 0)
  dimension "d88" = 59
  dimension "d89" = 3.75
  dimension "d94" = 10
  dimension "d96" = 2.2738
  dimension "d98" = 10
revolve "Revolution4" add sketch "Sketch3" angle 360 about axis through (-30, 4, 75.5) along (0, -1, 0) contours L0 L5 L6 L7 | L8 L10 L9 L5
revolve "Revolution5" add sketch "Sketch3" angle 100 about axis through (-30, 4, 75.5) along (0, 1, 0) contours L11 L12 L13 L10
pattern_circular "Circular Pattern3" count 3 over 360 about axis through (-30, -60, 75.5) along (0, 1, 0) of "Revolution5"
equation "\"d11\" = 0.5 * d6"
equation "\"d12\" = d8"
equation "\"d15\" = d8"
equation "\"d16\" = d8"
equation "\"d22\" = d8"
equation "\"d27\" = d8"
equation "\"d28\" = d8"
equation "\"d31\" = d8"
equation "\"d33\" = d8"
equation "\"d34\" = d8"
equation "\"d35\" = d8"
equation "\"d36\" = d8"
properties part number "OneLensHolder"
